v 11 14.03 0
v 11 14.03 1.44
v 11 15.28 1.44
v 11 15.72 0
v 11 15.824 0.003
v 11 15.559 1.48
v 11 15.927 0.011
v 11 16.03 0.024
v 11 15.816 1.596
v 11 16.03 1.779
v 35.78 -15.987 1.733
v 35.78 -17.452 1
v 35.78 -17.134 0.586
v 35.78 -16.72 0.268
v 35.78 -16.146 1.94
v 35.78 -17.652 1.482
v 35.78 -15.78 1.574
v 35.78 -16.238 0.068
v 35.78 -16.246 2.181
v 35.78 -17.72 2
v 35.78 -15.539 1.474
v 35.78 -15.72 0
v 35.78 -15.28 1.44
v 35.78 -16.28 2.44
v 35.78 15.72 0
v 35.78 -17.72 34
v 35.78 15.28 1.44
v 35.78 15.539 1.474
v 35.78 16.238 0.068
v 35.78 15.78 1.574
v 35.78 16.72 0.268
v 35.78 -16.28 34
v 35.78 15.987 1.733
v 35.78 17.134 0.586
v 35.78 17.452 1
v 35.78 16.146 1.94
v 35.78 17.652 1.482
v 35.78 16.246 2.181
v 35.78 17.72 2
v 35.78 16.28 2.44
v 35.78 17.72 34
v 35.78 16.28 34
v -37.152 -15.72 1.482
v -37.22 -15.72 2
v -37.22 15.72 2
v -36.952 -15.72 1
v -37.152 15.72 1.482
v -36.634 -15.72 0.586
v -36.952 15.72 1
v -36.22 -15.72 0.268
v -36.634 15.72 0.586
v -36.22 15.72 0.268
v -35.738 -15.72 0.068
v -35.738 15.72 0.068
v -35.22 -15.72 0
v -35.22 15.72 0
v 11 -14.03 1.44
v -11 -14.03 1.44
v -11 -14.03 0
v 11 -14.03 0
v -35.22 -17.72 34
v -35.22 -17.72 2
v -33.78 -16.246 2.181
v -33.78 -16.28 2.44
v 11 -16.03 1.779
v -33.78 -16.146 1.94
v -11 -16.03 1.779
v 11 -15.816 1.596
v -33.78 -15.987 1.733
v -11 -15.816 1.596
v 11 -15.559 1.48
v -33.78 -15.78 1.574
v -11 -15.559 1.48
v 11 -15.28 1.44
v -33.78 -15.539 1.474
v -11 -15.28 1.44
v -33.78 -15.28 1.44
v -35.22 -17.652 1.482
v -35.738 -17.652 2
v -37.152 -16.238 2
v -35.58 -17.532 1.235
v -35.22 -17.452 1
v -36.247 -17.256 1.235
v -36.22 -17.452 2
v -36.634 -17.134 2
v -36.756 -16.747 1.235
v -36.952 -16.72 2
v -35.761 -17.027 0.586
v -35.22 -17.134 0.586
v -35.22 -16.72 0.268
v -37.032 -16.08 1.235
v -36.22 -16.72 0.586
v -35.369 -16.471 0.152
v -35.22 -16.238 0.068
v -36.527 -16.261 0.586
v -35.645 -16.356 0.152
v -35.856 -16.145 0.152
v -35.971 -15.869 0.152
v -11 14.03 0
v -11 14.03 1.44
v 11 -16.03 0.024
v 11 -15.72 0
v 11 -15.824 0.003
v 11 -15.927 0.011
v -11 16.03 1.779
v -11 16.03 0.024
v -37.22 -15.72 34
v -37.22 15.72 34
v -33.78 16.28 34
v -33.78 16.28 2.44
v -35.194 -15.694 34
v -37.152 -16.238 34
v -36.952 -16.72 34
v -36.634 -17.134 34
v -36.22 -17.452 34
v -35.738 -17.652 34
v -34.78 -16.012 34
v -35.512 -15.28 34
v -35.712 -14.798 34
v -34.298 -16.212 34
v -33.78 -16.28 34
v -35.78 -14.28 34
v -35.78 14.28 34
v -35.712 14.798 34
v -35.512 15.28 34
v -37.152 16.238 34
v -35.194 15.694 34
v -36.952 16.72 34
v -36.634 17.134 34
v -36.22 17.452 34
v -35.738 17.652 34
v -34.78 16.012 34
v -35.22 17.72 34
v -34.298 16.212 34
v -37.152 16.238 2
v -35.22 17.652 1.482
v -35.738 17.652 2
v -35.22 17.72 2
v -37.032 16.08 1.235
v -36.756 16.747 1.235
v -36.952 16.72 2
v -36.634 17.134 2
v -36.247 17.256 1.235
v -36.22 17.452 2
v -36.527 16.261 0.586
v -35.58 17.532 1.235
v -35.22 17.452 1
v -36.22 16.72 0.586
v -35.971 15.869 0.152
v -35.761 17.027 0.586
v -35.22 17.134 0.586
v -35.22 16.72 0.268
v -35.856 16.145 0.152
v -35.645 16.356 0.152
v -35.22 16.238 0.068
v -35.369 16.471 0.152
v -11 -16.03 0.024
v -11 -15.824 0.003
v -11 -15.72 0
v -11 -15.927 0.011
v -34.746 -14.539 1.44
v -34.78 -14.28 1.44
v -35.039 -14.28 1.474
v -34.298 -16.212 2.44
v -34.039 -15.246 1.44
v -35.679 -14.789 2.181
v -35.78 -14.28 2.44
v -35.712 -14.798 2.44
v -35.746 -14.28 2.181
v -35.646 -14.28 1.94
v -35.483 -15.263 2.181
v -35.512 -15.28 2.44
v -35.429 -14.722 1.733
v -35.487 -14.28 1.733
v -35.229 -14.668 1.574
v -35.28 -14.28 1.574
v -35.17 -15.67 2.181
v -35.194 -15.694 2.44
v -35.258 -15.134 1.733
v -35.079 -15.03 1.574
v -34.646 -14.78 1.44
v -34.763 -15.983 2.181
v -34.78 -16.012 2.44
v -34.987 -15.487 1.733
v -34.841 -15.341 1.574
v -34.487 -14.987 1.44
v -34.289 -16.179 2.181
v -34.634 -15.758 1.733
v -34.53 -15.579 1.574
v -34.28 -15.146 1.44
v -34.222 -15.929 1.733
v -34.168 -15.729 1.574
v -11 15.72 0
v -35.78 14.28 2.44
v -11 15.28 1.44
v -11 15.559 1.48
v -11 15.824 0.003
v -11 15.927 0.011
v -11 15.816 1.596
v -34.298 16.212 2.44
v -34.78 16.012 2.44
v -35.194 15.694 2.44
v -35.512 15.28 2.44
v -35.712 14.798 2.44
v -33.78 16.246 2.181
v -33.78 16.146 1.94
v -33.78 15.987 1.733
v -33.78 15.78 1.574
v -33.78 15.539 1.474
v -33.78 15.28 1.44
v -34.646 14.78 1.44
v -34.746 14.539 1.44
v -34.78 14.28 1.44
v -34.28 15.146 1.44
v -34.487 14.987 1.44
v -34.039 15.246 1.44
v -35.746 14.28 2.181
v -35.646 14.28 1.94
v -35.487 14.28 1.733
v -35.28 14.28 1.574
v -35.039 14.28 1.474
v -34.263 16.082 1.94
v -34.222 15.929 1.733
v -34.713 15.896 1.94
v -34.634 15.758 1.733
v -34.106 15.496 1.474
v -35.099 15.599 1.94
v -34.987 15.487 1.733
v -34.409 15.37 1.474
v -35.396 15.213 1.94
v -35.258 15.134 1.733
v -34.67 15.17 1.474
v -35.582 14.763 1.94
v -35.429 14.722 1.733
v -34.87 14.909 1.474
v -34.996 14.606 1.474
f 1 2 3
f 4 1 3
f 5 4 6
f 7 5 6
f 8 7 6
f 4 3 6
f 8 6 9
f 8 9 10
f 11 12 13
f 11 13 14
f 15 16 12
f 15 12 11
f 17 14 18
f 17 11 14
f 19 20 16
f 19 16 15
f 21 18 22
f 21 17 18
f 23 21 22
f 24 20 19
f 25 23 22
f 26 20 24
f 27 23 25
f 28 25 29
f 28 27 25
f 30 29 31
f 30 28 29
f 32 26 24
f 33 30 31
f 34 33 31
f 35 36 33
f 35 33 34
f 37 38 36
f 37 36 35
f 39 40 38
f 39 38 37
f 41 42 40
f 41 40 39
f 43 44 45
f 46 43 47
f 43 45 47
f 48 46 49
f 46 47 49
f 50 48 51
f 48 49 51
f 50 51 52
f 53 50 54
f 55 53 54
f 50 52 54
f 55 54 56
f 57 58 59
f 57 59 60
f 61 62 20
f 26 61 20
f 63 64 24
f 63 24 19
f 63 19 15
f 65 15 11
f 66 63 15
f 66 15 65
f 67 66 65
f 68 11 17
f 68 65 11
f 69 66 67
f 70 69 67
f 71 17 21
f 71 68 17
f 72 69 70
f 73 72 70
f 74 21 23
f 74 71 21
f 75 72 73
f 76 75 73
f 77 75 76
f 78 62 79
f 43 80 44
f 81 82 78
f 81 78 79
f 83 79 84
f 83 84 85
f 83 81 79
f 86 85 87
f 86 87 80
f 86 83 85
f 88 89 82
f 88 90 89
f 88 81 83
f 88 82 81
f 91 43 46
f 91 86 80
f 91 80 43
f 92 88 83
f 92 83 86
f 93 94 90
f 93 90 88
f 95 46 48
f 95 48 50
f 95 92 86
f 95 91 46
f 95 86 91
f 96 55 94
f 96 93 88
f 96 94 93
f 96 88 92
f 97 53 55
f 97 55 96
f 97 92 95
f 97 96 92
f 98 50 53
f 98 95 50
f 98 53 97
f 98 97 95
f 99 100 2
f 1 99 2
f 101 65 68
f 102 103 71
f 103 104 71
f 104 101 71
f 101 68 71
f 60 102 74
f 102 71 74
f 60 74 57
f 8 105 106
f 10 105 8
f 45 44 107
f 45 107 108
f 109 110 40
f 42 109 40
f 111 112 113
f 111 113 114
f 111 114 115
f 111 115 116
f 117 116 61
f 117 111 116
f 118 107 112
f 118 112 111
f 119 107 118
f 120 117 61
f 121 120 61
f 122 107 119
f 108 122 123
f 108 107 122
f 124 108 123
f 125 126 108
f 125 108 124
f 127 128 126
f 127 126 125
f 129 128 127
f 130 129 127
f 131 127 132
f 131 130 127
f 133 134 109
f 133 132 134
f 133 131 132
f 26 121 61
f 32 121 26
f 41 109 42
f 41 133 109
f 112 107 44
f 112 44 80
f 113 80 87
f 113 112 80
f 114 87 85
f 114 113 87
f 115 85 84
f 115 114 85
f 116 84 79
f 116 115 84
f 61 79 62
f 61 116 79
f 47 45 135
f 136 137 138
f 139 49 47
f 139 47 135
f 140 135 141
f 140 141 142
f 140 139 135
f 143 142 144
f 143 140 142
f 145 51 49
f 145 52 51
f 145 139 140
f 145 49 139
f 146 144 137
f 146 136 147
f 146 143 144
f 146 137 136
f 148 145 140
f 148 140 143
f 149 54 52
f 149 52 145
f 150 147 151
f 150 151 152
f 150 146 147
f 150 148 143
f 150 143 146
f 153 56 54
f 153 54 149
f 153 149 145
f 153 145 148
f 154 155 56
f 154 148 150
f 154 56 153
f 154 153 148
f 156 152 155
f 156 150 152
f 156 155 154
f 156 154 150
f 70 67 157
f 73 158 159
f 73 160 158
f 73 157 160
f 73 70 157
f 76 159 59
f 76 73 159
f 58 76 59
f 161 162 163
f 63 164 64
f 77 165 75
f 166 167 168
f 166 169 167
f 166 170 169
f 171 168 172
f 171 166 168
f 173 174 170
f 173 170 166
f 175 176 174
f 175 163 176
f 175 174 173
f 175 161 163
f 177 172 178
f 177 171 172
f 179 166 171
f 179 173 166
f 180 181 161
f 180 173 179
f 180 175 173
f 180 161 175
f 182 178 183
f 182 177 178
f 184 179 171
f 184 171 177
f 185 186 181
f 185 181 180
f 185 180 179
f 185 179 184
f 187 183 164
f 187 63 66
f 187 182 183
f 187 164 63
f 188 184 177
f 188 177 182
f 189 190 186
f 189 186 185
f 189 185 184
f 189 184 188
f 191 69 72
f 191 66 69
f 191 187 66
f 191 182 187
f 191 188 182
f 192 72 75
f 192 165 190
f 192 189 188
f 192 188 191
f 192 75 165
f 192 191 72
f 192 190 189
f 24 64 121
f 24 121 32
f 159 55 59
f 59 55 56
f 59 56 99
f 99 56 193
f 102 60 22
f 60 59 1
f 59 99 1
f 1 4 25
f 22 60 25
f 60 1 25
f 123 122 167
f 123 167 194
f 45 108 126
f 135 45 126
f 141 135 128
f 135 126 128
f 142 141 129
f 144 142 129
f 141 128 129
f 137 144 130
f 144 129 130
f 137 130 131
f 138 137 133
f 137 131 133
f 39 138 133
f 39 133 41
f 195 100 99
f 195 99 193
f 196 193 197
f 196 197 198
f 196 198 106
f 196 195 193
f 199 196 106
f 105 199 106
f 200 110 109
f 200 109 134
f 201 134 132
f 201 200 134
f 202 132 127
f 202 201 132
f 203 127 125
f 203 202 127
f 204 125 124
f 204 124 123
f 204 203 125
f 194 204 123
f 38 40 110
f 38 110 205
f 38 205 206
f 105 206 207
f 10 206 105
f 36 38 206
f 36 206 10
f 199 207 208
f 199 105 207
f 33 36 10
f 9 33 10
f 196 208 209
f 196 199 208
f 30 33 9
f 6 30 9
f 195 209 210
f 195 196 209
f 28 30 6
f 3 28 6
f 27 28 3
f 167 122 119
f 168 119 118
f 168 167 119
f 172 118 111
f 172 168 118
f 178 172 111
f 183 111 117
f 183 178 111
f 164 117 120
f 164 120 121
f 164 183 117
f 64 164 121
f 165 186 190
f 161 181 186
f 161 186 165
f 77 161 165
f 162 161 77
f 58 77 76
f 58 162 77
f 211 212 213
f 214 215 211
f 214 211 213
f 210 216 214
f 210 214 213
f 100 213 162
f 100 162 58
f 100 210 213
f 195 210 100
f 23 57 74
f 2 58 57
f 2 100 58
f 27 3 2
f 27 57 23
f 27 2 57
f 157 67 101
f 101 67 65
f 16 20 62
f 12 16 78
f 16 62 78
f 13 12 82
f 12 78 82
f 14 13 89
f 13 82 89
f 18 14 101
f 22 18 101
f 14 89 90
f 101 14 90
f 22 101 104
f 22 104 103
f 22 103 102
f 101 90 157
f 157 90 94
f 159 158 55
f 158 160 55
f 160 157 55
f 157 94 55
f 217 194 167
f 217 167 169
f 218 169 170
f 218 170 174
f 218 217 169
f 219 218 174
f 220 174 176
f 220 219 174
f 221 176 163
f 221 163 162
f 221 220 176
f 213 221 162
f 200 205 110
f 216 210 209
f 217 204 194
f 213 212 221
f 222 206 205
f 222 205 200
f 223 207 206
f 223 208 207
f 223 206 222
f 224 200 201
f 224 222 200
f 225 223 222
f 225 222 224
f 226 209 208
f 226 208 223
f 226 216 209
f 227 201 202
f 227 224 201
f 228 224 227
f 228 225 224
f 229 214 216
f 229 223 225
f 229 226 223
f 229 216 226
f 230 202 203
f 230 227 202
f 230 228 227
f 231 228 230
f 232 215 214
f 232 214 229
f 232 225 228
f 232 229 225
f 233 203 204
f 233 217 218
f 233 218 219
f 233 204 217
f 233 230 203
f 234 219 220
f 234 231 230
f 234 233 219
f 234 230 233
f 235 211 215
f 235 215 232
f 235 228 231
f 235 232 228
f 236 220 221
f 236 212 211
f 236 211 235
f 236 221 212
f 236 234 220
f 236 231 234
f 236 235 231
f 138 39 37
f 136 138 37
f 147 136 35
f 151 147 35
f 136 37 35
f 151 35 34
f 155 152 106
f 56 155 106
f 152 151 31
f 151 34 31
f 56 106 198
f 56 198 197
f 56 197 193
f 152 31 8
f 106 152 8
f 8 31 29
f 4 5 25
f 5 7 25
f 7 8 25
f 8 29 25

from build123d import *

# Parameters (mm, degrees)
F0_W         = 74.44
F0_H         = 35.44
F1_DEPTH     = 34
F2_T         = -1.44
F3_DEPTH     = 1.44
F4_R         = 2
F5_R         = 2
F6_W         = 22
F6_H         = 2
F7_DEPTH     = 1.441
F8_T1_DEPTH  = 28.56
F8_T6_DEPTH  = 69.56
F8_T12_DEPTH = 69.56
F8_T18_DEPTH = 69.56
F8_T25_DEPTH = 69.56
F8_T31_DEPTH = 69.56
F8_T35_ANGLE = 90
F8_T37_ANGLE = 90
F8_T41_DEPTH = 69.56
F8_T47_DEPTH = 69.56
F8_T53_DEPTH = 69.56
F8_T60_DEPTH = 69.56
F8_T66_DEPTH = 69.56


# Not quite as in the source:
# - a fillet or chamfer that OpenCascade refuses, or shapes differently, is made with other operations: its cross-section is extruded or revolved along the edge and cut away or added


with BuildPart() as f1:
    # F0 (on Top) → F1 (new body)
    with BuildSketch(Plane.XY):
        Rectangle(F0_W, F0_H)
    extrude(amount=F1_DEPTH)

    # F2
    f2_openings = [f1.faces().sort_by_distance(p)[0] for p in [
        (0, 0, 34),
    ]]
    offset(amount=F2_T, openings=f2_openings)

    # F3 (cut): a face of the model
    f3_faces = [f1.faces().sort_by_distance(p)[0] for p in [
        (37.22, 0, 17),
    ]]
    extrude(f3_faces, amount=-F3_DEPTH, mode=Mode.SUBTRACT)

    # F4
    f4_edges = [f1.edges().sort_by_distance(p)[0] for p in [
        (-35.78, -16.28, 17.72),
        (-35.78, 16.28, 17.72),
        (-37.22, 17.72, 17),
        (-37.22, -17.72, 17),
    ]]
    fillet(f4_edges, radius=F4_R)

    # F5
    f5_edges = [f1.edges().sort_by_distance(p)[0] for p in [
        (-37.22, 0, 0),
        (0.28, -17.72, 0),
        (0.28, 17.72, 0),
    ]]
    fillet(f5_edges, radius=F5_R)

    # F6 (on face) → F7 (cut, through all)
    with BuildSketch(Plane.XY.offset(1.44)):
        with Locations((0, 15.03)):
            Rectangle(F6_W, F6_H)
        with Locations((0, -15.03)):
            Rectangle(F6_W, F6_H)
    extrude(amount=-F7_DEPTH, mode=Mode.SUBTRACT)

    # F8: fillet of radius 1 on 1 edges, made by hand

    # F8_s2 → F8_t1 (join)
    with BuildSketch(Plane.XZ.offset(-14.28)):
        with BuildLine():
            ThreePointArc((-35.78, 2.44), (-35.4871067812, 1.7328932188), (-34.78, 1.44))
            Line((-34.78, 1.44), (-35.78, 1.44))
            Line((-35.78, 1.44), (-35.78, 2.44))
        make_face()
    extrude(amount=F8_T1_DEPTH)


with BuildPart() as f8_tool4:
    # F8_s5 → F8_t6 (new body)
    with BuildSketch(Plane.YZ.offset(-33.78)):
        with BuildLine():
            ThreePointArc((-16.28, 2.44), (-15.9871067812, 1.7328932188), (-15.28, 1.44))
            Line((-15.28, 1.44), (-16.28, 1.44))
            Line((-16.28, 1.44), (-16.28, 2.44))
        make_face()
    extrude(amount=F8_T6_DEPTH)

    split(bisect_by=Plane.YZ.offset(-11), keep=Keep.BOTTOM)

    split(bisect_by=Plane.XZ.offset(16.03), keep=Keep.TOP)


with BuildPart() as f1_1:
    add(f1.part)

    # F8_t3: union F8_tool4
    add(f8_tool4.part)


with BuildPart() as f8_tool10:
    # F8_s11 → F8_t12 (new body)
    with BuildSketch(Plane.YZ.offset(-33.78)):
        with BuildLine():
            ThreePointArc((-16.28, 2.44), (-15.9871067812, 1.7328932188), (-15.28, 1.44))
            Line((-15.28, 1.44), (-16.28, 1.44))
            Line((-16.28, 1.44), (-16.28, 2.44))
        make_face()
    extrude(amount=F8_T12_DEPTH)

    split(bisect_by=Plane.YZ.offset(-11), keep=Keep.BOTTOM)

    split(bisect_by=Plane.XZ.offset(16.03), keep=Keep.BOTTOM)


with BuildPart() as f1_2:
    add(f1_1.part)

    # F8_t9: union F8_tool10
    add(f8_tool10.part)


with BuildPart() as f8_tool16:
    # F8_s17 → F8_t18 (new body)
    with BuildSketch(Plane.YZ.offset(-33.78)):
        with BuildLine():
            ThreePointArc((-16.28, 2.44), (-15.9871067812, 1.7328932188), (-15.28, 1.44))
            Line((-15.28, 1.44), (-16.28, 1.44))
            Line((-16.28, 1.44), (-16.28, 2.44))
        make_face()
    extrude(amount=F8_T18_DEPTH)

    split(bisect_by=Plane.YZ.offset(-11), keep=Keep.TOP)

    split(bisect_by=Plane.XZ.offset(16.03), keep=Keep.TOP)

    split(bisect_by=Plane.YZ.offset(11), keep=Keep.BOTTOM)


with BuildPart() as f1_3:
    add(f1_2.part)

    # F8_t15: union F8_tool16
    add(f8_tool16.part)


with BuildPart() as f8_tool23:
    # F8_s24 → F8_t25 (new body)
    with BuildSketch(Plane.YZ.offset(-33.78)):
        with BuildLine():
            ThreePointArc((-16.28, 2.44), (-15.9871067812, 1.7328932188), (-15.28, 1.44))
            Line((-15.28, 1.44), (-16.28, 1.44))
            Line((-16.28, 1.44), (-16.28, 2.44))
        make_face()
    extrude(amount=F8_T25_DEPTH)

    split(bisect_by=Plane.XZ.offset(16.03), keep=Keep.TOP)

    split(bisect_by=Plane.YZ.offset(11), keep=Keep.TOP)


with BuildPart() as f1_4:
    add(f1_3.part)

    # F8_t22: union F8_tool23
    add(f8_tool23.part)


with BuildPart() as f8_tool29:
    # F8_s30 → F8_t31 (new body)
    with BuildSketch(Plane.YZ.offset(-33.78)):
        with BuildLine():
            ThreePointArc((-16.28, 2.44), (-15.9871067812, 1.7328932188), (-15.28, 1.44))
            Line((-15.28, 1.44), (-16.28, 1.44))
            Line((-16.28, 1.44), (-16.28, 2.44))
        make_face()
    extrude(amount=F8_T31_DEPTH)

    split(bisect_by=Plane.XZ.offset(16.03), keep=Keep.BOTTOM)

    split(bisect_by=Plane.YZ.offset(11), keep=Keep.TOP)


with BuildPart() as f1_5:
    add(f1_4.part)

    # F8_t28: union F8_tool29
    add(f8_tool29.part)

    # F8_s34 → F8_t35 (revolve)
    with BuildSketch(Plane.XZ.offset(14.28)):
        with BuildLine():
            ThreePointArc((-35.78, 2.44), (-35.4871067812, 1.7328932188), (-34.78, 1.44))
            Line((-34.78, 1.44), (-35.78, 1.44))
            Line((-35.78, 1.44), (-35.78, 2.44))
        make_face()
    revolve(axis=Axis((-33.78, -14.28, 1.44), (0, 0, 1)), revolution_arc=F8_T35_ANGLE)

    # F8_s36 → F8_t37 (revolve)
    with BuildSketch(Plane.YZ.offset(-33.78)):
        with BuildLine():
            ThreePointArc((16.28, 2.44), (15.9871067812, 1.7328932188), (15.28, 1.44))
            Line((15.28, 1.44), (16.28, 1.44))
            Line((16.28, 1.44), (16.28, 2.44))
        make_face()
    revolve(axis=Axis((-33.78, 14.28, 1.44), (0, 0, 1)), revolution_arc=F8_T37_ANGLE)


with BuildPart() as f8_tool39:
    # F8_s40 → F8_t41 (new body)
    with BuildSketch(Plane.YZ.offset(35.78)):
        with BuildLine():
            ThreePointArc((16.28, 2.44), (15.9871067812, 1.7328932188), (15.28, 1.44))
            Line((15.28, 1.44), (16.28, 1.44))
            Line((16.28, 1.44), (16.28, 2.44))
        make_face()
    extrude(amount=-F8_T41_DEPTH)

    split(bisect_by=Plane.YZ.offset(11), keep=Keep.TOP)

    split(bisect_by=Plane.XZ.offset(-16.03), keep=Keep.BOTTOM)


with BuildPart() as f1_6:
    add(f1_5.part)

    # F8_t38: union F8_tool39
    add(f8_tool39.part)


with BuildPart() as f8_tool45:
    # F8_s46 → F8_t47 (new body)
    with BuildSketch(Plane.YZ.offset(35.78)):
        with BuildLine():
            ThreePointArc((16.28, 2.44), (15.9871067812, 1.7328932188), (15.28, 1.44))
            Line((15.28, 1.44), (16.28, 1.44))
            Line((16.28, 1.44), (16.28, 2.44))
        make_face()
    extrude(amount=-F8_T47_DEPTH)

    split(bisect_by=Plane.YZ.offset(11), keep=Keep.TOP)

    split(bisect_by=Plane.XZ.offset(-16.03), keep=Keep.TOP)


with BuildPart() as f1_7:
    add(f1_6.part)

    # F8_t44: union F8_tool45
    add(f8_tool45.part)


with BuildPart() as f8_tool51:
    # F8_s52 → F8_t53 (new body)
    with BuildSketch(Plane.YZ.offset(35.78)):
        with BuildLine():
            ThreePointArc((16.28, 2.44), (15.9871067812, 1.7328932188), (15.28, 1.44))
            Line((15.28, 1.44), (16.28, 1.44))
            Line((16.28, 1.44), (16.28, 2.44))
        make_face()
    extrude(amount=-F8_T53_DEPTH)

    split(bisect_by=Plane.YZ.offset(11), keep=Keep.BOTTOM)

    split(bisect_by=Plane.XZ.offset(-16.03), keep=Keep.BOTTOM)

    split(bisect_by=Plane.YZ.offset(-11), keep=Keep.TOP)


with BuildPart() as f1_8:
    add(f1_7.part)

    # F8_t50: union F8_tool51
    add(f8_tool51.part)


with BuildPart() as f8_tool58:
    # F8_s59 → F8_t60 (new body)
    with BuildSketch(Plane.YZ.offset(35.78)):
        with BuildLine():
            ThreePointArc((16.28, 2.44), (15.9871067812, 1.7328932188), (15.28, 1.44))
            Line((15.28, 1.44), (16.28, 1.44))
            Line((16.28, 1.44), (16.28, 2.44))
        make_face()
    extrude(amount=-F8_T60_DEPTH)

    split(bisect_by=Plane.XZ.offset(-16.03), keep=Keep.BOTTOM)

    split(bisect_by=Plane.YZ.offset(-11), keep=Keep.BOTTOM)


with BuildPart() as f1_9:
    add(f1_8.part)

    # F8_t57: union F8_tool58
    add(f8_tool58.part)


with BuildPart() as f8_tool64:
    # F8_s65 → F8_t66 (new body)
    with BuildSketch(Plane.YZ.offset(35.78)):
        with BuildLine():
            ThreePointArc((16.28, 2.44), (15.9871067812, 1.7328932188), (15.28, 1.44))
            Line((15.28, 1.44), (16.28, 1.44))
            Line((16.28, 1.44), (16.28, 2.44))
        make_face()
    extrude(amount=-F8_T66_DEPTH)

    split(bisect_by=Plane.XZ.offset(-16.03), keep=Keep.TOP)

    split(bisect_by=Plane.YZ.offset(-11), keep=Keep.BOTTOM)


with BuildPart() as f1_10:
    add(f1_9.part)

    # F8_t63: union F8_tool64
    add(f8_tool64.part)


solid = f1_10.part
